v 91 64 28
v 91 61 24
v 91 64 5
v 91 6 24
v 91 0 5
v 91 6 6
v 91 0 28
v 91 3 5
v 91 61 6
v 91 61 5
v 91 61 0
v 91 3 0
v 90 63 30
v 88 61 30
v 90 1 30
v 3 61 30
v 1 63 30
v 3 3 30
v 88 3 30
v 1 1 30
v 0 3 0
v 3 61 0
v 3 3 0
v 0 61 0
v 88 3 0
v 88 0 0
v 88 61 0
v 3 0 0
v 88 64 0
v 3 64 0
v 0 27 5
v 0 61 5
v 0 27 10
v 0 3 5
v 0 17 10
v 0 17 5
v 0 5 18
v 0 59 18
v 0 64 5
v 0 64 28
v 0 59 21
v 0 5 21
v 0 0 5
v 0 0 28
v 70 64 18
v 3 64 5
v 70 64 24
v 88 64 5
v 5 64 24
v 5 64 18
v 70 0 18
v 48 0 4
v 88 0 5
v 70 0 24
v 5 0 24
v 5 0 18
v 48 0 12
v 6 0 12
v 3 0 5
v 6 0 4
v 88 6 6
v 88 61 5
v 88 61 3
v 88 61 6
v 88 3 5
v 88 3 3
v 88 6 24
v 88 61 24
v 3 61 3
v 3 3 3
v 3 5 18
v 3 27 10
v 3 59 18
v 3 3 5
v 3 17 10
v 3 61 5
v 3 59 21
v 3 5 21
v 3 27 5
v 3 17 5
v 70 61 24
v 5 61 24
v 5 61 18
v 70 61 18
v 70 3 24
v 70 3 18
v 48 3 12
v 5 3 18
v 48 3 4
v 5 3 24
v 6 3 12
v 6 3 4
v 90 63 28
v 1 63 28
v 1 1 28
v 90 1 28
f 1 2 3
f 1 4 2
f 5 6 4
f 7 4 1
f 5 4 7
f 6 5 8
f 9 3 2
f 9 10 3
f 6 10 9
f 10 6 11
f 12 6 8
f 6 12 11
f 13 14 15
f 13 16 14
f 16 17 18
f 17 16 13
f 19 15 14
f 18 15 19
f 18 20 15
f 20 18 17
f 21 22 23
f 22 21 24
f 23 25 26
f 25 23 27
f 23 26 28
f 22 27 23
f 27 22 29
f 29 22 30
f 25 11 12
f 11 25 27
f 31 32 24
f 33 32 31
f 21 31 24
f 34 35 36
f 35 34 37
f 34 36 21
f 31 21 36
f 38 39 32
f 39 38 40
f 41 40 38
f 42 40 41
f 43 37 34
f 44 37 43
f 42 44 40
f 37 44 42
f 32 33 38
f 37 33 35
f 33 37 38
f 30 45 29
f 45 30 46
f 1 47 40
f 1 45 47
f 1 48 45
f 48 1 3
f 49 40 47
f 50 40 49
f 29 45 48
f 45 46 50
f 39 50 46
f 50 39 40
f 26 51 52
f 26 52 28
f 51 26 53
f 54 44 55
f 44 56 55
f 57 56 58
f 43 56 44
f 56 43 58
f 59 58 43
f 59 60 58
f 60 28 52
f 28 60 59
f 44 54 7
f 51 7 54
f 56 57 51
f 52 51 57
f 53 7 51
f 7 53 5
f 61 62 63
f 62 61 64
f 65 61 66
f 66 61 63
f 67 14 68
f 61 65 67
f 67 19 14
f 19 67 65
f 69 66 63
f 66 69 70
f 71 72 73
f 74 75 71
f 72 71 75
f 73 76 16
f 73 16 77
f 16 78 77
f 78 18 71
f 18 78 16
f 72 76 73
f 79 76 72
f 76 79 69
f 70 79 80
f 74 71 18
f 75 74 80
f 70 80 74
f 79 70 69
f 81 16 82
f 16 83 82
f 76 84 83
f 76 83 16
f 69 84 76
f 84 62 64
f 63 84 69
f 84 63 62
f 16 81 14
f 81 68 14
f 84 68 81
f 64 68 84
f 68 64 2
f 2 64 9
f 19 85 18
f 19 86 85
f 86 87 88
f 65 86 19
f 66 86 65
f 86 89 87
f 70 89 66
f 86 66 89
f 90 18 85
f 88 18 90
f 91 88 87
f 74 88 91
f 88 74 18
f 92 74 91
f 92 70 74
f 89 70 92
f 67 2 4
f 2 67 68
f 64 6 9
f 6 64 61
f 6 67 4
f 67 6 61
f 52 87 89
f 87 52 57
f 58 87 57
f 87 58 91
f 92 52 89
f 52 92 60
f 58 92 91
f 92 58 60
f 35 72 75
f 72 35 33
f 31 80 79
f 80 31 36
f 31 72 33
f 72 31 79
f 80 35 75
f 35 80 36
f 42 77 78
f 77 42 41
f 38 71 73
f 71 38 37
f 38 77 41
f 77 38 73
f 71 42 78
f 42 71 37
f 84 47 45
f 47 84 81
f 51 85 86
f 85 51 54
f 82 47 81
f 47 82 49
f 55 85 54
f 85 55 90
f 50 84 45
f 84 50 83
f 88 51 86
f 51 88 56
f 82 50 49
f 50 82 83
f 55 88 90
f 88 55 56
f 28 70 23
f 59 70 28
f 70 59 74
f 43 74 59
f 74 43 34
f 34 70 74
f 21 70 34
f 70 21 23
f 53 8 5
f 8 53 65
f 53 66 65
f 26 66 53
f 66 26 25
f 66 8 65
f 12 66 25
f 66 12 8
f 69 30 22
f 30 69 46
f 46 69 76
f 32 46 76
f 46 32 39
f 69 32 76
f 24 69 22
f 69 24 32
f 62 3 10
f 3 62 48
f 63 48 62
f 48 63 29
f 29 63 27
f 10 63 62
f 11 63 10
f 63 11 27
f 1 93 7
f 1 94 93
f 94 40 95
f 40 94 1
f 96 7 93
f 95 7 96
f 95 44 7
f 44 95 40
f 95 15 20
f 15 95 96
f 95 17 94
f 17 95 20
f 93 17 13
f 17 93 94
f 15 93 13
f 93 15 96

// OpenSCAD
difference()
{
  cube([91,64,30]);
  translate([3,3,3]) cube([85,58,30]);
  translate([85,6,6]) cube([10,55,18]);
  translate([6,-5,4]) cube([42,10,8]);
  translate([-5,17,5]) cube([10,10,5]);
  translate([-5,5,18]) cube([10,54,3]);
  translate([5,-5,18]) cube([65,75,6]);
  translate([-1,-1,-1]) cube([4,4,6]);
  translate([88,-1,-1]) cube([4,4,6]);
  translate([-1,61,-1]) cube([4,4,6]);
  translate([88,61,-1]) cube([4,4,6]);
  translate([-1,-1,28]) cube([95,2,6]);
  translate([-1,-1,28]) cube([2,66,6]);
  translate([-1,63,28]) cube([95,2,6]);
  translate([90,-1,28]) cube([2,66,6]);

}
